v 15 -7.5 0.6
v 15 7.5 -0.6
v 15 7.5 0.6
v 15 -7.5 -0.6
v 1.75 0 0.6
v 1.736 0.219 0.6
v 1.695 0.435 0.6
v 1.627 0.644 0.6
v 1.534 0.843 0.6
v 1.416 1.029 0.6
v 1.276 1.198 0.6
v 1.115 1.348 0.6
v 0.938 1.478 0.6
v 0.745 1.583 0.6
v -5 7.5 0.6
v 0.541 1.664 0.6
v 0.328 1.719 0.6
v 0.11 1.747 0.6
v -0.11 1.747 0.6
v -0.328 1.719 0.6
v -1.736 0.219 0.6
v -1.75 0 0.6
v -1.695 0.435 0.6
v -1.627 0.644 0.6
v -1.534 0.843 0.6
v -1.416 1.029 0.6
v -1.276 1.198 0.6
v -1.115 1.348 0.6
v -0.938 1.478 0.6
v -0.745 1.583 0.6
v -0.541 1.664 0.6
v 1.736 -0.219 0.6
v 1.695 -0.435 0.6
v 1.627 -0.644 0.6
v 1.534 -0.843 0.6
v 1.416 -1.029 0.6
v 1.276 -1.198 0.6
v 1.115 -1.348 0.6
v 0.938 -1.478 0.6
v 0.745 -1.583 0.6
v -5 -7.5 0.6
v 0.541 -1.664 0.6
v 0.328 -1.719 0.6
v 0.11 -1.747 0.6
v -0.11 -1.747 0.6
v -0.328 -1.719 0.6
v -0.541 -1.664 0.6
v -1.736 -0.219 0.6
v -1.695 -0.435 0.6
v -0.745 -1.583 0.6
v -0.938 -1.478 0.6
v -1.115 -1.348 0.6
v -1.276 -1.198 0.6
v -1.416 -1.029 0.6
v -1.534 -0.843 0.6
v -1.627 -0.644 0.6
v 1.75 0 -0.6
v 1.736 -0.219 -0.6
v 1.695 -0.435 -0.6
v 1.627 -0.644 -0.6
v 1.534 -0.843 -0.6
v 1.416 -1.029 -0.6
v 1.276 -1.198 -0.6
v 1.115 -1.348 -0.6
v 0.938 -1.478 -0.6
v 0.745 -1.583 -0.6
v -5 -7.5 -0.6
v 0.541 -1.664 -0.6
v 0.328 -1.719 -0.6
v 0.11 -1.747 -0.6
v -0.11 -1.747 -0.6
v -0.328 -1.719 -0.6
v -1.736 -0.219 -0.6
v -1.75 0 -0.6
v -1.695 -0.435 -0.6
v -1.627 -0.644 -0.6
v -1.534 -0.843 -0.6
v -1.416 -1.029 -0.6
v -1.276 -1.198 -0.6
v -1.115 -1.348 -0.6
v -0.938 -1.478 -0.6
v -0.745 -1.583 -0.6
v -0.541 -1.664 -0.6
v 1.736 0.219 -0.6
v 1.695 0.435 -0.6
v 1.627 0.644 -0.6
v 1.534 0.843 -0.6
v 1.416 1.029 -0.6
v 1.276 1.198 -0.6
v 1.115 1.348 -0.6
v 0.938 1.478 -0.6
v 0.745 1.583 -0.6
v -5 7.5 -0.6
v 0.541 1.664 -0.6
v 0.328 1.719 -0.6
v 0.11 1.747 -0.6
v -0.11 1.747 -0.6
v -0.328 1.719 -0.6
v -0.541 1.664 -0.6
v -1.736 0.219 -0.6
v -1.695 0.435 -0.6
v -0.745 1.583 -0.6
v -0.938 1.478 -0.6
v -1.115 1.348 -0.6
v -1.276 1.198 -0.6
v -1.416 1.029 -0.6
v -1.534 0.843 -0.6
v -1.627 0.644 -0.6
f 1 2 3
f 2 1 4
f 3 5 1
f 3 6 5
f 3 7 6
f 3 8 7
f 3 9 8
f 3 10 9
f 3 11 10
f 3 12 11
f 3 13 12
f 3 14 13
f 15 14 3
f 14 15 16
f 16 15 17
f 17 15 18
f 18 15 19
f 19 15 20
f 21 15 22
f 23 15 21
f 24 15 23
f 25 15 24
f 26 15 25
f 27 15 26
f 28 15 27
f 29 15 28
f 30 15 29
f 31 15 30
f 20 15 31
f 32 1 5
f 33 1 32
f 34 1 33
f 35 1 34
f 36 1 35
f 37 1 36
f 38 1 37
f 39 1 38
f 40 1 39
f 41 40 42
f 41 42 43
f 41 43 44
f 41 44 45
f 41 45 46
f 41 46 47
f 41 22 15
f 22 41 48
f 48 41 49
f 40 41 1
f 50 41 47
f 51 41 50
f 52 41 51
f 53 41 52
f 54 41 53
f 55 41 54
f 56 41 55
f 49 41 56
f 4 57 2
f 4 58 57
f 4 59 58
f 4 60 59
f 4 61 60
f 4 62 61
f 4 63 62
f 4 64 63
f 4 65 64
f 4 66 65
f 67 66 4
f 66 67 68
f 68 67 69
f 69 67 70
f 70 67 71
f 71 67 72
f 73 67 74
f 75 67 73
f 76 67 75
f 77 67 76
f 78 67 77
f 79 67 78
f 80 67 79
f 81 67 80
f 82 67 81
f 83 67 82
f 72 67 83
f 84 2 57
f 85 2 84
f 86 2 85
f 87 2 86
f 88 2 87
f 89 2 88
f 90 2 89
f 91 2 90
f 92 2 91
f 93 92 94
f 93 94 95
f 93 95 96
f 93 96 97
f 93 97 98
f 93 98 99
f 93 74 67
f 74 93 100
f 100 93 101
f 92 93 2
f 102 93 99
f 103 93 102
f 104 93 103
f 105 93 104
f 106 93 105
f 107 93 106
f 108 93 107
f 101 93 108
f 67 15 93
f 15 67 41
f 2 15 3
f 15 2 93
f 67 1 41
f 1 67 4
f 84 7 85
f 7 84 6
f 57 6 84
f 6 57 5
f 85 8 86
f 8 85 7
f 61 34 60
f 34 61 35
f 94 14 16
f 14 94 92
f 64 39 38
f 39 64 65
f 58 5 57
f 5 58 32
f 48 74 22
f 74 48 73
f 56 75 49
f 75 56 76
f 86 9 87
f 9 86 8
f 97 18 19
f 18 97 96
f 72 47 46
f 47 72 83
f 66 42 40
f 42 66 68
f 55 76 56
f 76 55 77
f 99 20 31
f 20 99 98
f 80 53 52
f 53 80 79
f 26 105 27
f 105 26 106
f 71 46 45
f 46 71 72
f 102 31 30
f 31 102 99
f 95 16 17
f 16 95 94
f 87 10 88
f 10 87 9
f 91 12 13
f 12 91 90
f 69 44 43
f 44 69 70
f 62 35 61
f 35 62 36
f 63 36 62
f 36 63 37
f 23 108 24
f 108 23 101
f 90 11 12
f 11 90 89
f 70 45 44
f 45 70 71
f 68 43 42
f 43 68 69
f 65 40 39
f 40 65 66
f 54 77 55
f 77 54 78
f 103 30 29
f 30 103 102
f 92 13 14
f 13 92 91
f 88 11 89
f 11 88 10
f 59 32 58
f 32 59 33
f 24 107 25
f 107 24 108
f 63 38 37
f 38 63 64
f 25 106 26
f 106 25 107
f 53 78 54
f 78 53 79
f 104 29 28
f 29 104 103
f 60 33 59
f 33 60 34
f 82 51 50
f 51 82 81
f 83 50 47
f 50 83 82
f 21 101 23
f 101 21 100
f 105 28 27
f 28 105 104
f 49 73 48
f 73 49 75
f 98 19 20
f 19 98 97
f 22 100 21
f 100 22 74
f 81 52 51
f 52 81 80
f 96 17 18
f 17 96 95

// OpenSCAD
difference(){
    
translate([5,0,0]) cube([20,15,1.2], center=true);

cylinder(d=3.5,h=2, $fn=50, center=true);
}
